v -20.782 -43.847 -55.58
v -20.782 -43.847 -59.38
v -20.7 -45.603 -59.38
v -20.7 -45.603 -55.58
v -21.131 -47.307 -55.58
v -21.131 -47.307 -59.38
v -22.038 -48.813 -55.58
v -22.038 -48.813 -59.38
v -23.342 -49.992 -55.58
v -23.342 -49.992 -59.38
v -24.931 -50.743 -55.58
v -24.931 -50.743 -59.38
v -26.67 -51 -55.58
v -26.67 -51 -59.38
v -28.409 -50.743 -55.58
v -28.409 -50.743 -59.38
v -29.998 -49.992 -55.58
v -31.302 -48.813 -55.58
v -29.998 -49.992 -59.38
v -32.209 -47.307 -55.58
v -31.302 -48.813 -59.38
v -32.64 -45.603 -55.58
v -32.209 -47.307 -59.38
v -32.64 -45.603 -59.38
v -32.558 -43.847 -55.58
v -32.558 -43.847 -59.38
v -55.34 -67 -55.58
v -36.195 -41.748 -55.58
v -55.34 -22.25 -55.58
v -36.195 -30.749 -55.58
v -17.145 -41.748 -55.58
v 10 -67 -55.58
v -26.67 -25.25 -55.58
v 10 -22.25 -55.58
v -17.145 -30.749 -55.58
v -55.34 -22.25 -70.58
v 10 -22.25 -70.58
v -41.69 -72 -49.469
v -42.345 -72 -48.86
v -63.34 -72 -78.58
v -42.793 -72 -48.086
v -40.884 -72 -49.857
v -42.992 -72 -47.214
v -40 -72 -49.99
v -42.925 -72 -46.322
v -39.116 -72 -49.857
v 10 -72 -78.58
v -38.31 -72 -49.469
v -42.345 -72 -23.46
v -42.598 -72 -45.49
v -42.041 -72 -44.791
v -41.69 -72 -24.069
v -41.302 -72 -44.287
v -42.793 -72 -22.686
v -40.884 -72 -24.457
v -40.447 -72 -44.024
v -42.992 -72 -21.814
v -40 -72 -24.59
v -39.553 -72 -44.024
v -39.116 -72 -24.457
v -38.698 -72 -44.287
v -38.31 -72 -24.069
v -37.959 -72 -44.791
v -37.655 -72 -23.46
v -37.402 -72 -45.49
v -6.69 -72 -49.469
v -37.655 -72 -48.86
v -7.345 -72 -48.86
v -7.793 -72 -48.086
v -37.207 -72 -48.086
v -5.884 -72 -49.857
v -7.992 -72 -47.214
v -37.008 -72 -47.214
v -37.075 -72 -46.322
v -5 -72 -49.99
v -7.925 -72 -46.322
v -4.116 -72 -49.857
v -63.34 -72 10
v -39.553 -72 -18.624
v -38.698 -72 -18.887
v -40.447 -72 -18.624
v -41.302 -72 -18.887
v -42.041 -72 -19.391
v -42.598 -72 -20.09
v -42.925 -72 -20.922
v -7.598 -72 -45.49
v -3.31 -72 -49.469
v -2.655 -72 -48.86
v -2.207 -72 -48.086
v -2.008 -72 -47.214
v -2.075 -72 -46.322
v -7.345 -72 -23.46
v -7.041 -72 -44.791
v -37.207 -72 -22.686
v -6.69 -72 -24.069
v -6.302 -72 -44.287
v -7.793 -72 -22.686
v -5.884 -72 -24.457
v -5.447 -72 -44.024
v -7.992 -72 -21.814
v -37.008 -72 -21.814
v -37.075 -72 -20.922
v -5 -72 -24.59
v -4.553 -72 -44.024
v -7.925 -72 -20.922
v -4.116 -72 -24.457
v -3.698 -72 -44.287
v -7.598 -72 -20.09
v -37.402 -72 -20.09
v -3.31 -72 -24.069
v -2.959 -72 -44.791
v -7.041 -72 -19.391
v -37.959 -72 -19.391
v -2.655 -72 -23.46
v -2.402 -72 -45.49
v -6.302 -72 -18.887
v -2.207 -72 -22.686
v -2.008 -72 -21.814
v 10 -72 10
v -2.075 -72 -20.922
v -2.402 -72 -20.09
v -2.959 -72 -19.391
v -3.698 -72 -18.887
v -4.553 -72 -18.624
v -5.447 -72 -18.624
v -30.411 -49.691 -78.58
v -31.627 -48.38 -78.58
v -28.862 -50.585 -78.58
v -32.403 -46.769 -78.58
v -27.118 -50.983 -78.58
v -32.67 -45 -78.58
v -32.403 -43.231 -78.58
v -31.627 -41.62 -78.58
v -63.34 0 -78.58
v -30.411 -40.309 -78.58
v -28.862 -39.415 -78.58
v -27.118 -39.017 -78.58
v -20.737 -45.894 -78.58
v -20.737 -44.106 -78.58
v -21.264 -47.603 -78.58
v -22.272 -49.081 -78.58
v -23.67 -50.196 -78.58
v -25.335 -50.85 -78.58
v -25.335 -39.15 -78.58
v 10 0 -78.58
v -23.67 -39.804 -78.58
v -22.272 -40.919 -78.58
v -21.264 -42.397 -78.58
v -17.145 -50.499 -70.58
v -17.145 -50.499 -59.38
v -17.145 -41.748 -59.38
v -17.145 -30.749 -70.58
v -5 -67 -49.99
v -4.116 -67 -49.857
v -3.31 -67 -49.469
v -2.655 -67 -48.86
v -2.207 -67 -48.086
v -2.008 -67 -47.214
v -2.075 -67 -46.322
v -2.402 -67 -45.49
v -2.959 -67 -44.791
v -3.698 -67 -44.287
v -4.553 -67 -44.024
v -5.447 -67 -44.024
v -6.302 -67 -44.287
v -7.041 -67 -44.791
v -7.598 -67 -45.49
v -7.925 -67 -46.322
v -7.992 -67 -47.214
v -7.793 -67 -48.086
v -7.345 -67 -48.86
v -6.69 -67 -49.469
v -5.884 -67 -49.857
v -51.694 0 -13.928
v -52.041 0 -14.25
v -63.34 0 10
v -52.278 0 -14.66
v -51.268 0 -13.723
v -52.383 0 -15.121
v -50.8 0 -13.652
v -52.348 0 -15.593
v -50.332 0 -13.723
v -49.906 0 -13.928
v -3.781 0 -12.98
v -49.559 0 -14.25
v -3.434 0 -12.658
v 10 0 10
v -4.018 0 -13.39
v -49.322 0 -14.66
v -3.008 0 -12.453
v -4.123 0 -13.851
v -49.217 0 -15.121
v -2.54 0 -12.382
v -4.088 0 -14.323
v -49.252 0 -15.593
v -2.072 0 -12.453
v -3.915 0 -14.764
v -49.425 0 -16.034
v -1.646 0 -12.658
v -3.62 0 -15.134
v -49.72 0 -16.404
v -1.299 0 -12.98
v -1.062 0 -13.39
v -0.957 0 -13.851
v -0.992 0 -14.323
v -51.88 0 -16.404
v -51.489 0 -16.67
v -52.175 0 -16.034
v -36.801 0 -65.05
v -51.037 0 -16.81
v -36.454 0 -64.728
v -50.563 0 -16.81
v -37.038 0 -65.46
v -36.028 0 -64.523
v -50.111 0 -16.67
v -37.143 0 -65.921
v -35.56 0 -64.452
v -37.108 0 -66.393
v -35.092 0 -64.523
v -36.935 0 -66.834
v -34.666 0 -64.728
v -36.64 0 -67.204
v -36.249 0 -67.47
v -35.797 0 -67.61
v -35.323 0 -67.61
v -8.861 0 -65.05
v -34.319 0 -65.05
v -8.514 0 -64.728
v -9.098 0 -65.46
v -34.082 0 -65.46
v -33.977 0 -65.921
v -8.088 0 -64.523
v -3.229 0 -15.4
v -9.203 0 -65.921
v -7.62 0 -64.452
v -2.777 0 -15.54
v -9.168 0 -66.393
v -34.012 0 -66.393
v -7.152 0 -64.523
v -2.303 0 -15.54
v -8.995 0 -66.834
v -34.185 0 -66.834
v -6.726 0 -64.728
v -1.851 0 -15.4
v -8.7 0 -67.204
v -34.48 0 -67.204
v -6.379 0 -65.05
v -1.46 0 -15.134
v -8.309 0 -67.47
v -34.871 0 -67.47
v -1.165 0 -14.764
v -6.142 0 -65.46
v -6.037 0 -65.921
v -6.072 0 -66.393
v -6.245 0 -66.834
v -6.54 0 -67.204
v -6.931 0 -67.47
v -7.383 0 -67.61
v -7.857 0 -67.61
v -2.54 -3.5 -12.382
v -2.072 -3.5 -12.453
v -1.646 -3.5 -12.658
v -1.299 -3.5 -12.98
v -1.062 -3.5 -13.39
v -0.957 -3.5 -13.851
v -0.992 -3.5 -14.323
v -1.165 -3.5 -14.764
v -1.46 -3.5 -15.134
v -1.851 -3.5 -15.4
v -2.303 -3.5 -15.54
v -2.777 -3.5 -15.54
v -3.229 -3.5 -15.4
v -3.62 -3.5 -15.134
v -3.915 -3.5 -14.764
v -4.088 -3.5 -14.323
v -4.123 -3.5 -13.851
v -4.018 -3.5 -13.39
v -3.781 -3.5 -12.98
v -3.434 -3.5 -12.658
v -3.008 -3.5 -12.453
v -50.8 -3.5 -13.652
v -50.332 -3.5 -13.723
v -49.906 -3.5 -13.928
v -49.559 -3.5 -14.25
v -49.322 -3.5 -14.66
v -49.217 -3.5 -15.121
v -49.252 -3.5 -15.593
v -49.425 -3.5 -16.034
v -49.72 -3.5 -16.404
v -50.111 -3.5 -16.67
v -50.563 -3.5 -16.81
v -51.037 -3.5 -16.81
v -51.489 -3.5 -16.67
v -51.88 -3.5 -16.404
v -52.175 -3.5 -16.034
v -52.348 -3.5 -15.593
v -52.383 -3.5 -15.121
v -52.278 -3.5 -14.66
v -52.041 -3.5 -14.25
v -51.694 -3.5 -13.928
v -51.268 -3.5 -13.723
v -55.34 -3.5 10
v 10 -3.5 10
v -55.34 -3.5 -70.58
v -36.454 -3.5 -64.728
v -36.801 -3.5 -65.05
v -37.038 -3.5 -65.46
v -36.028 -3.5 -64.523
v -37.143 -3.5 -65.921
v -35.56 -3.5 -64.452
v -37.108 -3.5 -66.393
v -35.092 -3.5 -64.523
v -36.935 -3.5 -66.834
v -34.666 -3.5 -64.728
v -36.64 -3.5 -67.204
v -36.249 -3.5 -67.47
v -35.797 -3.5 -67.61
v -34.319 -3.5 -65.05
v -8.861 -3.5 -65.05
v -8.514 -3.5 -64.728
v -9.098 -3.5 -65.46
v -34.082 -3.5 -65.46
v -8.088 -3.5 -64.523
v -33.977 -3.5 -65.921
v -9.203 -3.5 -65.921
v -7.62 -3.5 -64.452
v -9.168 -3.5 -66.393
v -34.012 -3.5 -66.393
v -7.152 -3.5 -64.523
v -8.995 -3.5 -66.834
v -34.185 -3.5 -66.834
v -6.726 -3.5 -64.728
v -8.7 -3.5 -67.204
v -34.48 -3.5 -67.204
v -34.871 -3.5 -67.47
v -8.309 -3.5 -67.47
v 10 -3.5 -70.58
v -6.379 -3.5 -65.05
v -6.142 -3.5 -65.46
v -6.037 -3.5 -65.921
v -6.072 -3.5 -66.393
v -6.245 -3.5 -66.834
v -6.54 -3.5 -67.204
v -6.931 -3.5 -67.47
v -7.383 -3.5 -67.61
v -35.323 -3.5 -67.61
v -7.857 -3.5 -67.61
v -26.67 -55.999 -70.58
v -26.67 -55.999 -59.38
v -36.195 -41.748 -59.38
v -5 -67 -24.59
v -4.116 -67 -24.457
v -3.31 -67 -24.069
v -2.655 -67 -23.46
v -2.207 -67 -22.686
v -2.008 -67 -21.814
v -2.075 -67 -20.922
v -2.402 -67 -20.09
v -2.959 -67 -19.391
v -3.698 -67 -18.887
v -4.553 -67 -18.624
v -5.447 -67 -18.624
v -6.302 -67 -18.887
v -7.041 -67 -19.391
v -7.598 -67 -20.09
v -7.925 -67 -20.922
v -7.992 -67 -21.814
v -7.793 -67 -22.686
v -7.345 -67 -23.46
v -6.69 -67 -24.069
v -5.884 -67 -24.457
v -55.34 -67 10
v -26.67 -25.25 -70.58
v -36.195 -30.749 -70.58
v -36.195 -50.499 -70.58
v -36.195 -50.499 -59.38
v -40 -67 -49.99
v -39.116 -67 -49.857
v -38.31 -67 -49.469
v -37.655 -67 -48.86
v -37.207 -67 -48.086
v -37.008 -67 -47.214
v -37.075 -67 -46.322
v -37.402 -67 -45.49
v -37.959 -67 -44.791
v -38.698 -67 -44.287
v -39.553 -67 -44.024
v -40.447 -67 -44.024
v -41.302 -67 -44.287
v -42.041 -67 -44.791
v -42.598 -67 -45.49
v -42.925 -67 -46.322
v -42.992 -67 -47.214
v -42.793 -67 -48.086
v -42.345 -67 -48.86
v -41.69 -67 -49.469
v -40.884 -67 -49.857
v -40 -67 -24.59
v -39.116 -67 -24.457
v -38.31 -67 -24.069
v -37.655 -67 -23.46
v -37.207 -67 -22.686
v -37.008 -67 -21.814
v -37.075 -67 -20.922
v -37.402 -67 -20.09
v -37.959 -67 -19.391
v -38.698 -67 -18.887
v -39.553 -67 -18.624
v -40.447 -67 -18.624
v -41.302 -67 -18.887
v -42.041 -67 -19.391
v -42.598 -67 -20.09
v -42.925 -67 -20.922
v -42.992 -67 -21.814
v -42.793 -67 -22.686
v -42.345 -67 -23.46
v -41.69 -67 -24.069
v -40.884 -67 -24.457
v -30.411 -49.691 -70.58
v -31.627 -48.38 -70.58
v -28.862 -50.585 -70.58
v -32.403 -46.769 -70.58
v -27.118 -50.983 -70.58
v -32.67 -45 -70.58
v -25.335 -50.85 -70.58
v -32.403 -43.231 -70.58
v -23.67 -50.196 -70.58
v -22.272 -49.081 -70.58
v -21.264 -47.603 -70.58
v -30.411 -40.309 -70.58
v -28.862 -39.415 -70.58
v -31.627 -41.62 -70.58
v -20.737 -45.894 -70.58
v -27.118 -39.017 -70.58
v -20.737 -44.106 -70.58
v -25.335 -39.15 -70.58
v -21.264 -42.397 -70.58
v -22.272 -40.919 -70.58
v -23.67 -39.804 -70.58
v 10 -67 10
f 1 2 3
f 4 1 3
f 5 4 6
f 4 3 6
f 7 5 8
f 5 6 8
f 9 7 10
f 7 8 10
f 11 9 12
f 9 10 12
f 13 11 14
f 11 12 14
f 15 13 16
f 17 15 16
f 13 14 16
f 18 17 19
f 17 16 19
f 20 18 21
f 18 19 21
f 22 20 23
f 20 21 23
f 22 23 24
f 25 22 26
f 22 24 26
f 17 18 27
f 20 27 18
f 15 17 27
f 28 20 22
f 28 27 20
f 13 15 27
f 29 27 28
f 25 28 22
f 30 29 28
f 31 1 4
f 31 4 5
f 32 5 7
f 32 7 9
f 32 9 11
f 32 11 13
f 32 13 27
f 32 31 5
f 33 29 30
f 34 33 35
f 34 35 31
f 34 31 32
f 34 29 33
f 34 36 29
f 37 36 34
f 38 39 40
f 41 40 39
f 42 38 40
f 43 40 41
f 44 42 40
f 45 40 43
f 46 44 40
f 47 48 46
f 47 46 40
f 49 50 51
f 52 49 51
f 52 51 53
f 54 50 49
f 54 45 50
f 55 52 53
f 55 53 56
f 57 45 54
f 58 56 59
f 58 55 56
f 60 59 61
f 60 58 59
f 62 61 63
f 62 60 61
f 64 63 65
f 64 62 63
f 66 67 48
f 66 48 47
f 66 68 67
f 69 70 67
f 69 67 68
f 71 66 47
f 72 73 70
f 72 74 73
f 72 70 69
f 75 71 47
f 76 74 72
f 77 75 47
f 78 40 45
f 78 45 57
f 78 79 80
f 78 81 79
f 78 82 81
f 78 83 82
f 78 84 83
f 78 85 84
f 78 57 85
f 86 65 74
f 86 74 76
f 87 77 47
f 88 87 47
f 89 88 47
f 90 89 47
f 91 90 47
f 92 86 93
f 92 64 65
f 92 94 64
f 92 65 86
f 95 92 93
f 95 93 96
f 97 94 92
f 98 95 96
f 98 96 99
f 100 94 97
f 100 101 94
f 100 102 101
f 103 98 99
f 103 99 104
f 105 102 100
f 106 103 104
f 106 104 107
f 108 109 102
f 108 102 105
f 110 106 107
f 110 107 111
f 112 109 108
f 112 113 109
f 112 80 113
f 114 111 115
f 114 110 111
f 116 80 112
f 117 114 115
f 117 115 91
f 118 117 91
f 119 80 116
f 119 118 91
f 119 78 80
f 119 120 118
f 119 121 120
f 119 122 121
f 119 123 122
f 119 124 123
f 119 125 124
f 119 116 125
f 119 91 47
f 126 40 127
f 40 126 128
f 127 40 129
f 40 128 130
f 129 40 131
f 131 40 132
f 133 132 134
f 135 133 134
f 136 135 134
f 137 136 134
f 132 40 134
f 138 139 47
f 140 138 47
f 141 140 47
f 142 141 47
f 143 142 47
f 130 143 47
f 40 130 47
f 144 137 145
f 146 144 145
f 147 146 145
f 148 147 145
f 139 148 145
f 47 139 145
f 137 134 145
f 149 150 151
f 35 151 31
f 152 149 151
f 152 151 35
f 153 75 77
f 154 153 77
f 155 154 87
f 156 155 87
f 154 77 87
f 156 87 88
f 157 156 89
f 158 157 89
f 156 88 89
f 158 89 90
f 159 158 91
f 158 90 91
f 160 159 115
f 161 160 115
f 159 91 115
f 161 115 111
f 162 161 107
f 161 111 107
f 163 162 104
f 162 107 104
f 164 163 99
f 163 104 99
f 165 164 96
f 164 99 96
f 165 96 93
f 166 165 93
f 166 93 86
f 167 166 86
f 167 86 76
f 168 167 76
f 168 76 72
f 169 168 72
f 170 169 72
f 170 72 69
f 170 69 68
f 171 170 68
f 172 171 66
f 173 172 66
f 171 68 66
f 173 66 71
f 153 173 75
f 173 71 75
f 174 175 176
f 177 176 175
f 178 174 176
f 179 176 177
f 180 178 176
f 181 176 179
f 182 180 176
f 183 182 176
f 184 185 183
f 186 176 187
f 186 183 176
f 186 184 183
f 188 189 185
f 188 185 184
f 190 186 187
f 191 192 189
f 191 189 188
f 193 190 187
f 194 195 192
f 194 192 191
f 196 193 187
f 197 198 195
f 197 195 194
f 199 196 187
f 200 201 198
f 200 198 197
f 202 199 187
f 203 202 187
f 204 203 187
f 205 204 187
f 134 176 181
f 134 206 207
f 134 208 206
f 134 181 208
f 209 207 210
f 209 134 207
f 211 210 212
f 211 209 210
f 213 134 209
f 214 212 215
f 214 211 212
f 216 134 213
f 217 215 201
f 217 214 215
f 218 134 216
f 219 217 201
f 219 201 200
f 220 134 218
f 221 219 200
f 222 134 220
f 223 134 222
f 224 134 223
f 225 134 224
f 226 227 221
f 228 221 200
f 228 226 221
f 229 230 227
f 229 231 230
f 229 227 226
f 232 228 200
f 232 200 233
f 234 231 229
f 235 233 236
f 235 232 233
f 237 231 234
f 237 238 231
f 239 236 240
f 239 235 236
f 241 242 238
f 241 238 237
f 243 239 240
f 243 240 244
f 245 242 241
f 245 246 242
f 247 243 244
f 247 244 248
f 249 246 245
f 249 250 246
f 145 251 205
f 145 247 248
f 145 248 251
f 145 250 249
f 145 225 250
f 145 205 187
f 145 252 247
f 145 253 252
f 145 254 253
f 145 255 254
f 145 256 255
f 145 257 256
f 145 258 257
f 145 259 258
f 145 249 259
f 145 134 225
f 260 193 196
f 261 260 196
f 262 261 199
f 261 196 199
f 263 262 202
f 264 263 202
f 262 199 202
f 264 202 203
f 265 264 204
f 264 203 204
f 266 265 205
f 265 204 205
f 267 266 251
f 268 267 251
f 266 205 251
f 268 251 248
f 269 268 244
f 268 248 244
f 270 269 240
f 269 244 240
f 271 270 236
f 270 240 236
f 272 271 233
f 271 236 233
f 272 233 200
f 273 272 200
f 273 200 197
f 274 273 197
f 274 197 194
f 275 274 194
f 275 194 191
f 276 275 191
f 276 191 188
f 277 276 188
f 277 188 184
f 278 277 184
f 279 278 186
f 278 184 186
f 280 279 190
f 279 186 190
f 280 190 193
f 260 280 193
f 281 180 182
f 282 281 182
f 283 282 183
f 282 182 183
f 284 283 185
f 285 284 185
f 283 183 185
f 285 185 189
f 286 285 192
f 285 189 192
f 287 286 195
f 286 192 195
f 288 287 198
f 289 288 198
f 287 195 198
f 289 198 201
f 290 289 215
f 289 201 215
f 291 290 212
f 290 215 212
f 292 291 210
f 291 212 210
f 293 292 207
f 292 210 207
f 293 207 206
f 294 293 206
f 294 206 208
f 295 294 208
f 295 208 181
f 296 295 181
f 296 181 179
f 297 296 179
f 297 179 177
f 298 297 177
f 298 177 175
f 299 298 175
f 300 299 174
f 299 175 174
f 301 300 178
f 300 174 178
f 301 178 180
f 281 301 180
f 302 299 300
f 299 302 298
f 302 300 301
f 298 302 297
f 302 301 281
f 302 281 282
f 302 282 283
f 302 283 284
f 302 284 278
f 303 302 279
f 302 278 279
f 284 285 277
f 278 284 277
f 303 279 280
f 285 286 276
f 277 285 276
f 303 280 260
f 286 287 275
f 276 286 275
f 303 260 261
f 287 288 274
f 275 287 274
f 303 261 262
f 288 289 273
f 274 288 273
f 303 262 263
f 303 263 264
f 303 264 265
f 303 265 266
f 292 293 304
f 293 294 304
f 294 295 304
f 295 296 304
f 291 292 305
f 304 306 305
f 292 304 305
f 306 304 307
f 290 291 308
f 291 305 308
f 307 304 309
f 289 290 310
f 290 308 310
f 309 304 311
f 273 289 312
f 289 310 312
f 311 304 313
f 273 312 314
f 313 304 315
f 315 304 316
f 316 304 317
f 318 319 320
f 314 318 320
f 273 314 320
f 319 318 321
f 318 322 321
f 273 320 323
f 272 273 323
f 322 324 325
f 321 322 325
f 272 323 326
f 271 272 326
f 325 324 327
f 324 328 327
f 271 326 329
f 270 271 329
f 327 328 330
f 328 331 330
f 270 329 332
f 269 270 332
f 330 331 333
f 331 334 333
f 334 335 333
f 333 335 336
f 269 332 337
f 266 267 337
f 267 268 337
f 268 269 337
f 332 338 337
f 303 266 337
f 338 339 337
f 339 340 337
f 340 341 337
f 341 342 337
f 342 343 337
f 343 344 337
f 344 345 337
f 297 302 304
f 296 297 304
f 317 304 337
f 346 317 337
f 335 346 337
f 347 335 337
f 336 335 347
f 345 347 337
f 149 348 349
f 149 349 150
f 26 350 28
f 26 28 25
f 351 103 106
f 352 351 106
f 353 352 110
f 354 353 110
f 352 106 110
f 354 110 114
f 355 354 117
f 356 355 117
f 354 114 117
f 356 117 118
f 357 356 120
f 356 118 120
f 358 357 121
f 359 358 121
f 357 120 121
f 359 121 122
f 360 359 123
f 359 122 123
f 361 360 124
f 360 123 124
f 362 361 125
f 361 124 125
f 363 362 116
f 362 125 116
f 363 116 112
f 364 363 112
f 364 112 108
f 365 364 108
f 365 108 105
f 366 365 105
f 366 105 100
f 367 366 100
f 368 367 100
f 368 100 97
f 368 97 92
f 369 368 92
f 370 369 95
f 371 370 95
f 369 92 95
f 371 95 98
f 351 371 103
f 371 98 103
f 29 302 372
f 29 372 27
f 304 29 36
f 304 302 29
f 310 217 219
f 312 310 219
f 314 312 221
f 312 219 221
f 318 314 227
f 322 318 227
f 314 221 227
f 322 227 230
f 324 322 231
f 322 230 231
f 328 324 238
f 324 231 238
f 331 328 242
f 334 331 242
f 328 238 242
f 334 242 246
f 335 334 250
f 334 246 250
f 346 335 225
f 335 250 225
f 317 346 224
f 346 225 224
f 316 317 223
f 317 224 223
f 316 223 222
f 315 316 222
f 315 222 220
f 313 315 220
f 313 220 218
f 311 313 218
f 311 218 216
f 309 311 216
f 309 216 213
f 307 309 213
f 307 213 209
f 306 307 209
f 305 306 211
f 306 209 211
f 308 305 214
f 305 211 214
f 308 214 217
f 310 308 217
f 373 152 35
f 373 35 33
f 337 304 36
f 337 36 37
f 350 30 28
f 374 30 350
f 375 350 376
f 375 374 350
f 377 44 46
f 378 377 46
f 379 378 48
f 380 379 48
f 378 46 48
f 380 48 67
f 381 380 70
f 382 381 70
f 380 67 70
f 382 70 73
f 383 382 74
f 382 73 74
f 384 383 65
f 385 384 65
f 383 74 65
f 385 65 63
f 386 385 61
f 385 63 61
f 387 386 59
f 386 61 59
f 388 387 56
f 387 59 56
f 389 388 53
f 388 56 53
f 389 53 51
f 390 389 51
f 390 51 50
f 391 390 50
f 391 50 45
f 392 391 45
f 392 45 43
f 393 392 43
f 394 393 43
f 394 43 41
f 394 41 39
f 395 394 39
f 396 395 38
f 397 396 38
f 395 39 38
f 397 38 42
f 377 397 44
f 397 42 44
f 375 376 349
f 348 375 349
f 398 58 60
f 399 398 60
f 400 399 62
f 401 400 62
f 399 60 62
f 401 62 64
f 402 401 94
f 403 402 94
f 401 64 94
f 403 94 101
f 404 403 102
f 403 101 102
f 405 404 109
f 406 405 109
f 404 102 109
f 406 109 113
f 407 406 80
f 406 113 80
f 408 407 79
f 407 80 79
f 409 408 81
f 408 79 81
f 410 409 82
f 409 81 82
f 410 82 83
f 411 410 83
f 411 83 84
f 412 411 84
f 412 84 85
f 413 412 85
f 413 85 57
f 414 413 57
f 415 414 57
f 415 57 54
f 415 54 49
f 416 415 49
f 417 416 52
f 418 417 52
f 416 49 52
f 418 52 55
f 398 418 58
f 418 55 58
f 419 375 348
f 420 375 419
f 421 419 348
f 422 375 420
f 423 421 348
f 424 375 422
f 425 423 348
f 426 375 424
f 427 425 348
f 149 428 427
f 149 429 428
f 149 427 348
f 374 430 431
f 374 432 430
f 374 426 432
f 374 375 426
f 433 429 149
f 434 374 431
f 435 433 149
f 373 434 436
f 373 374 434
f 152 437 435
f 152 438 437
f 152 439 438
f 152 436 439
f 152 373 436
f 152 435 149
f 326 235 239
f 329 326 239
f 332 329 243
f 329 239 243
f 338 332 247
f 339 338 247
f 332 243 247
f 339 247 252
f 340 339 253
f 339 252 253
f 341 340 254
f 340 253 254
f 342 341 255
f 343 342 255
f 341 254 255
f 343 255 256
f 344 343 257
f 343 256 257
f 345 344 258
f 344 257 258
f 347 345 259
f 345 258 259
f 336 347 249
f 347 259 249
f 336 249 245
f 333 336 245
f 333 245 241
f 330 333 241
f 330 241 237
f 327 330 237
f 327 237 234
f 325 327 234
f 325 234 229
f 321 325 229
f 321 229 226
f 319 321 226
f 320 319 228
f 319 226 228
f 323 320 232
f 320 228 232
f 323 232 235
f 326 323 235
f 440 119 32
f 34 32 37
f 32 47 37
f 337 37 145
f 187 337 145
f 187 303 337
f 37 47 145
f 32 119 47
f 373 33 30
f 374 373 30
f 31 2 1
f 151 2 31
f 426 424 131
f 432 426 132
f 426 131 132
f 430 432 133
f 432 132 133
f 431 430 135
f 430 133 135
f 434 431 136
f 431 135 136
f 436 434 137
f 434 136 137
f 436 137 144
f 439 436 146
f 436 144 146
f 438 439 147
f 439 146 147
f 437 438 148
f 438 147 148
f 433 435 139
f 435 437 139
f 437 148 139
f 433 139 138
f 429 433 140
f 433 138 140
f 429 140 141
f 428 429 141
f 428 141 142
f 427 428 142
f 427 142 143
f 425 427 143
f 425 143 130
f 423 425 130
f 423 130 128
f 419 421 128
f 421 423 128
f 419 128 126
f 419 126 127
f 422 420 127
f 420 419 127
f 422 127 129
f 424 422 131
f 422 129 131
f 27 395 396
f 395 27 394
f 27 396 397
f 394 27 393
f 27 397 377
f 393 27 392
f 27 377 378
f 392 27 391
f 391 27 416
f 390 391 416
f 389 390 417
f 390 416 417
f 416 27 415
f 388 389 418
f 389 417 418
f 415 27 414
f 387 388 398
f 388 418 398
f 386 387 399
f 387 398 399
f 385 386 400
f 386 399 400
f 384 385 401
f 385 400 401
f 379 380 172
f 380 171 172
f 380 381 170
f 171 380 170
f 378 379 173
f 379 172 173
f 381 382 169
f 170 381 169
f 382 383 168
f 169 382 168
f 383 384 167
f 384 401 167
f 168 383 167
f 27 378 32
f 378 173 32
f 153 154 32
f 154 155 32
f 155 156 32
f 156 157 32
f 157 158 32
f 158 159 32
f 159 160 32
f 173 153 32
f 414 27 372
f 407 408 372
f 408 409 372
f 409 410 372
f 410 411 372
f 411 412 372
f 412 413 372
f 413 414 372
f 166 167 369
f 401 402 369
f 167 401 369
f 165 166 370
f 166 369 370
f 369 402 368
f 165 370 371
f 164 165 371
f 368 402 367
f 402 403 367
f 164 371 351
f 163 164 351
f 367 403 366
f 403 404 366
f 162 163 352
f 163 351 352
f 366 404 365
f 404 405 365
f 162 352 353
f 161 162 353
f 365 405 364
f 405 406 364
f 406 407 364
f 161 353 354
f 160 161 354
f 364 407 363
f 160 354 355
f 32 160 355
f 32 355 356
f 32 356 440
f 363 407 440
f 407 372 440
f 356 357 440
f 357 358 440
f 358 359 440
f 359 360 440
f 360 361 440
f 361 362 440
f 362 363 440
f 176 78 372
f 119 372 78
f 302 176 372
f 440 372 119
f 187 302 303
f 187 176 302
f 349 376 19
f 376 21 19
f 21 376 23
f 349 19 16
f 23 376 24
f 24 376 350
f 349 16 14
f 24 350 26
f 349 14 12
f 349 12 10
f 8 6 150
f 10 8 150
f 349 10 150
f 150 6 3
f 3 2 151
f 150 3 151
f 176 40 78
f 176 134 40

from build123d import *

# Parameters (mm, degrees)
SKETCH2_W           = 73.34
SKETCH2_H           = 88.58
BOSS_EXTRUDE1_DEPTH = 3.5
SKETCH1_R           = 1.5875
CUT_EXTRUDE1_DEPTH  = 3.5
BOSS_EXTRUDE2_DEPTH = 63.5
SKETCH4_W           = 73.34
SKETCH4_H           = 88.58
BOSS_EXTRUDE3_DEPTH = 5
SKETCH5_R           = 3
CUT_EXTRUDE2_DEPTH  = 5
SKETCH6_W           = 65.34
SKETCH6_H           = 44.75
BOSS_EXTRUDE4_DEPTH = 15
CUT_EXTRUDE3_DEPTH  = 126.25610564
SKETCH11_R          = 6
CUT_EXTRUDE4_DEPTH  = 131.546436183
CUT_EXTRUDE5_DEPTH  = 11.2


with BuildPart() as part:
    # Sketch2 → Boss-Extrude1 (new body)
    with BuildSketch(Plane(origin=(0, 0, 0), x_dir=(1, 0, 0), z_dir=(0, 1, 0))):
        with Locations((-26.67, 34.29)):
            Rectangle(SKETCH2_W, SKETCH2_H)
    extrude(amount=-BOSS_EXTRUDE1_DEPTH)

    # Sketch1 → Cut-Extrude1 (cut)
    with BuildSketch(Plane(origin=(0, 0, 0), x_dir=(1, 0, 0), z_dir=(0, 1, 0))):
        with Locations(Location((-7.62, 66.04, 0), (0, 0, 270))):
            Circle(SKETCH1_R)
        with Locations(Location((-35.56, 66.04, 0), (0, 0, 270))):
            Circle(SKETCH1_R)
        with Locations(Location((-2.54, 13.97, 0), (0, 0, 270))):
            Circle(SKETCH1_R)
        with Locations(Location((-50.8, 15.24, 0), (0, 0, 270))):
            Circle(SKETCH1_R)
    extrude(amount=-CUT_EXTRUDE1_DEPTH, mode=Mode.SUBTRACT)

    # Sketch3 → Boss-Extrude2 (add)
    with BuildSketch(Plane.XZ.offset(3.5)):
        Polygon((10, -78.58), (-63.34, -78.58), (-63.34, 10), (-55.34, 10), (-55.34, -70.58), (10, -70.58), align=None)
    extrude(amount=BOSS_EXTRUDE2_DEPTH)

    # Sketch4 → Boss-Extrude3 (add)
    with BuildSketch(Plane.XZ.offset(67)):
        with Locations((-26.67, -34.29)):
            Rectangle(SKETCH4_W, SKETCH4_H)
    extrude(amount=BOSS_EXTRUDE3_DEPTH)

    # Sketch5 → Cut-Extrude2 (cut)
    with BuildSketch(Plane.XZ.offset(72)):
        with Locations(Location((-5, -21.59, 0), (0, 0, 270))):
            Circle(SKETCH5_R)
        with Locations(Location((-5, -46.99, 0), (0, 0, 270))):
            Circle(SKETCH5_R)
        with Locations(Location((-40, -21.59, 0), (0, 0, 270))):
            Circle(SKETCH5_R)
        with Locations(Location((-40, -46.99, 0), (0, 0, 270))):
            Circle(SKETCH5_R)
    extrude(amount=-CUT_EXTRUDE2_DEPTH, mode=Mode.SUBTRACT)

    # Sketch6 → Boss-Extrude4 (add)
    with BuildSketch(Plane.XY.offset(-70.58)):
        with Locations((-22.67, -44.625)):
            Rectangle(SKETCH6_W, SKETCH6_H)
    extrude(amount=BOSS_EXTRUDE4_DEPTH)

    # Sketch9 → Cut-Extrude3 (cut, through all)
    with BuildSketch(Plane.XY.offset(-70.58)):
        Polygon((-17.145, -41.747783942), (-17.145, -30.749261314), (-26.67, -25.25), (-36.195, -30.749261314), (-36.195, -41.747783942), (-26.67, -47.247045256), align=None)
    extrude(amount=CUT_EXTRUDE3_DEPTH, mode=Mode.SUBTRACT)

    # Sketch11 → Cut-Extrude4 (cut, through all)
    with BuildSketch(Plane(origin=(0, 0, -78.58), x_dir=(-1, 0, 0), z_dir=(0, 0, -1))):
        with Locations((26.67, -45)):
            Circle(SKETCH11_R)
    extrude(amount=-CUT_EXTRUDE4_DEPTH, mode=Mode.SUBTRACT)

    # Sketch12 → Cut-Extrude5 (cut)
    with BuildSketch(Plane.XY.offset(-70.58)):
        Polygon((-17.145, -39.500738686), (-26.67, -34.001477372), (-36.195, -39.500738686), (-36.195, -50.499261314), (-26.67, -55.998522628), (-17.145, -50.499261314), align=None)
    extrude(amount=CUT_EXTRUDE5_DEPTH, mode=Mode.SUBTRACT)


solid = part.part
